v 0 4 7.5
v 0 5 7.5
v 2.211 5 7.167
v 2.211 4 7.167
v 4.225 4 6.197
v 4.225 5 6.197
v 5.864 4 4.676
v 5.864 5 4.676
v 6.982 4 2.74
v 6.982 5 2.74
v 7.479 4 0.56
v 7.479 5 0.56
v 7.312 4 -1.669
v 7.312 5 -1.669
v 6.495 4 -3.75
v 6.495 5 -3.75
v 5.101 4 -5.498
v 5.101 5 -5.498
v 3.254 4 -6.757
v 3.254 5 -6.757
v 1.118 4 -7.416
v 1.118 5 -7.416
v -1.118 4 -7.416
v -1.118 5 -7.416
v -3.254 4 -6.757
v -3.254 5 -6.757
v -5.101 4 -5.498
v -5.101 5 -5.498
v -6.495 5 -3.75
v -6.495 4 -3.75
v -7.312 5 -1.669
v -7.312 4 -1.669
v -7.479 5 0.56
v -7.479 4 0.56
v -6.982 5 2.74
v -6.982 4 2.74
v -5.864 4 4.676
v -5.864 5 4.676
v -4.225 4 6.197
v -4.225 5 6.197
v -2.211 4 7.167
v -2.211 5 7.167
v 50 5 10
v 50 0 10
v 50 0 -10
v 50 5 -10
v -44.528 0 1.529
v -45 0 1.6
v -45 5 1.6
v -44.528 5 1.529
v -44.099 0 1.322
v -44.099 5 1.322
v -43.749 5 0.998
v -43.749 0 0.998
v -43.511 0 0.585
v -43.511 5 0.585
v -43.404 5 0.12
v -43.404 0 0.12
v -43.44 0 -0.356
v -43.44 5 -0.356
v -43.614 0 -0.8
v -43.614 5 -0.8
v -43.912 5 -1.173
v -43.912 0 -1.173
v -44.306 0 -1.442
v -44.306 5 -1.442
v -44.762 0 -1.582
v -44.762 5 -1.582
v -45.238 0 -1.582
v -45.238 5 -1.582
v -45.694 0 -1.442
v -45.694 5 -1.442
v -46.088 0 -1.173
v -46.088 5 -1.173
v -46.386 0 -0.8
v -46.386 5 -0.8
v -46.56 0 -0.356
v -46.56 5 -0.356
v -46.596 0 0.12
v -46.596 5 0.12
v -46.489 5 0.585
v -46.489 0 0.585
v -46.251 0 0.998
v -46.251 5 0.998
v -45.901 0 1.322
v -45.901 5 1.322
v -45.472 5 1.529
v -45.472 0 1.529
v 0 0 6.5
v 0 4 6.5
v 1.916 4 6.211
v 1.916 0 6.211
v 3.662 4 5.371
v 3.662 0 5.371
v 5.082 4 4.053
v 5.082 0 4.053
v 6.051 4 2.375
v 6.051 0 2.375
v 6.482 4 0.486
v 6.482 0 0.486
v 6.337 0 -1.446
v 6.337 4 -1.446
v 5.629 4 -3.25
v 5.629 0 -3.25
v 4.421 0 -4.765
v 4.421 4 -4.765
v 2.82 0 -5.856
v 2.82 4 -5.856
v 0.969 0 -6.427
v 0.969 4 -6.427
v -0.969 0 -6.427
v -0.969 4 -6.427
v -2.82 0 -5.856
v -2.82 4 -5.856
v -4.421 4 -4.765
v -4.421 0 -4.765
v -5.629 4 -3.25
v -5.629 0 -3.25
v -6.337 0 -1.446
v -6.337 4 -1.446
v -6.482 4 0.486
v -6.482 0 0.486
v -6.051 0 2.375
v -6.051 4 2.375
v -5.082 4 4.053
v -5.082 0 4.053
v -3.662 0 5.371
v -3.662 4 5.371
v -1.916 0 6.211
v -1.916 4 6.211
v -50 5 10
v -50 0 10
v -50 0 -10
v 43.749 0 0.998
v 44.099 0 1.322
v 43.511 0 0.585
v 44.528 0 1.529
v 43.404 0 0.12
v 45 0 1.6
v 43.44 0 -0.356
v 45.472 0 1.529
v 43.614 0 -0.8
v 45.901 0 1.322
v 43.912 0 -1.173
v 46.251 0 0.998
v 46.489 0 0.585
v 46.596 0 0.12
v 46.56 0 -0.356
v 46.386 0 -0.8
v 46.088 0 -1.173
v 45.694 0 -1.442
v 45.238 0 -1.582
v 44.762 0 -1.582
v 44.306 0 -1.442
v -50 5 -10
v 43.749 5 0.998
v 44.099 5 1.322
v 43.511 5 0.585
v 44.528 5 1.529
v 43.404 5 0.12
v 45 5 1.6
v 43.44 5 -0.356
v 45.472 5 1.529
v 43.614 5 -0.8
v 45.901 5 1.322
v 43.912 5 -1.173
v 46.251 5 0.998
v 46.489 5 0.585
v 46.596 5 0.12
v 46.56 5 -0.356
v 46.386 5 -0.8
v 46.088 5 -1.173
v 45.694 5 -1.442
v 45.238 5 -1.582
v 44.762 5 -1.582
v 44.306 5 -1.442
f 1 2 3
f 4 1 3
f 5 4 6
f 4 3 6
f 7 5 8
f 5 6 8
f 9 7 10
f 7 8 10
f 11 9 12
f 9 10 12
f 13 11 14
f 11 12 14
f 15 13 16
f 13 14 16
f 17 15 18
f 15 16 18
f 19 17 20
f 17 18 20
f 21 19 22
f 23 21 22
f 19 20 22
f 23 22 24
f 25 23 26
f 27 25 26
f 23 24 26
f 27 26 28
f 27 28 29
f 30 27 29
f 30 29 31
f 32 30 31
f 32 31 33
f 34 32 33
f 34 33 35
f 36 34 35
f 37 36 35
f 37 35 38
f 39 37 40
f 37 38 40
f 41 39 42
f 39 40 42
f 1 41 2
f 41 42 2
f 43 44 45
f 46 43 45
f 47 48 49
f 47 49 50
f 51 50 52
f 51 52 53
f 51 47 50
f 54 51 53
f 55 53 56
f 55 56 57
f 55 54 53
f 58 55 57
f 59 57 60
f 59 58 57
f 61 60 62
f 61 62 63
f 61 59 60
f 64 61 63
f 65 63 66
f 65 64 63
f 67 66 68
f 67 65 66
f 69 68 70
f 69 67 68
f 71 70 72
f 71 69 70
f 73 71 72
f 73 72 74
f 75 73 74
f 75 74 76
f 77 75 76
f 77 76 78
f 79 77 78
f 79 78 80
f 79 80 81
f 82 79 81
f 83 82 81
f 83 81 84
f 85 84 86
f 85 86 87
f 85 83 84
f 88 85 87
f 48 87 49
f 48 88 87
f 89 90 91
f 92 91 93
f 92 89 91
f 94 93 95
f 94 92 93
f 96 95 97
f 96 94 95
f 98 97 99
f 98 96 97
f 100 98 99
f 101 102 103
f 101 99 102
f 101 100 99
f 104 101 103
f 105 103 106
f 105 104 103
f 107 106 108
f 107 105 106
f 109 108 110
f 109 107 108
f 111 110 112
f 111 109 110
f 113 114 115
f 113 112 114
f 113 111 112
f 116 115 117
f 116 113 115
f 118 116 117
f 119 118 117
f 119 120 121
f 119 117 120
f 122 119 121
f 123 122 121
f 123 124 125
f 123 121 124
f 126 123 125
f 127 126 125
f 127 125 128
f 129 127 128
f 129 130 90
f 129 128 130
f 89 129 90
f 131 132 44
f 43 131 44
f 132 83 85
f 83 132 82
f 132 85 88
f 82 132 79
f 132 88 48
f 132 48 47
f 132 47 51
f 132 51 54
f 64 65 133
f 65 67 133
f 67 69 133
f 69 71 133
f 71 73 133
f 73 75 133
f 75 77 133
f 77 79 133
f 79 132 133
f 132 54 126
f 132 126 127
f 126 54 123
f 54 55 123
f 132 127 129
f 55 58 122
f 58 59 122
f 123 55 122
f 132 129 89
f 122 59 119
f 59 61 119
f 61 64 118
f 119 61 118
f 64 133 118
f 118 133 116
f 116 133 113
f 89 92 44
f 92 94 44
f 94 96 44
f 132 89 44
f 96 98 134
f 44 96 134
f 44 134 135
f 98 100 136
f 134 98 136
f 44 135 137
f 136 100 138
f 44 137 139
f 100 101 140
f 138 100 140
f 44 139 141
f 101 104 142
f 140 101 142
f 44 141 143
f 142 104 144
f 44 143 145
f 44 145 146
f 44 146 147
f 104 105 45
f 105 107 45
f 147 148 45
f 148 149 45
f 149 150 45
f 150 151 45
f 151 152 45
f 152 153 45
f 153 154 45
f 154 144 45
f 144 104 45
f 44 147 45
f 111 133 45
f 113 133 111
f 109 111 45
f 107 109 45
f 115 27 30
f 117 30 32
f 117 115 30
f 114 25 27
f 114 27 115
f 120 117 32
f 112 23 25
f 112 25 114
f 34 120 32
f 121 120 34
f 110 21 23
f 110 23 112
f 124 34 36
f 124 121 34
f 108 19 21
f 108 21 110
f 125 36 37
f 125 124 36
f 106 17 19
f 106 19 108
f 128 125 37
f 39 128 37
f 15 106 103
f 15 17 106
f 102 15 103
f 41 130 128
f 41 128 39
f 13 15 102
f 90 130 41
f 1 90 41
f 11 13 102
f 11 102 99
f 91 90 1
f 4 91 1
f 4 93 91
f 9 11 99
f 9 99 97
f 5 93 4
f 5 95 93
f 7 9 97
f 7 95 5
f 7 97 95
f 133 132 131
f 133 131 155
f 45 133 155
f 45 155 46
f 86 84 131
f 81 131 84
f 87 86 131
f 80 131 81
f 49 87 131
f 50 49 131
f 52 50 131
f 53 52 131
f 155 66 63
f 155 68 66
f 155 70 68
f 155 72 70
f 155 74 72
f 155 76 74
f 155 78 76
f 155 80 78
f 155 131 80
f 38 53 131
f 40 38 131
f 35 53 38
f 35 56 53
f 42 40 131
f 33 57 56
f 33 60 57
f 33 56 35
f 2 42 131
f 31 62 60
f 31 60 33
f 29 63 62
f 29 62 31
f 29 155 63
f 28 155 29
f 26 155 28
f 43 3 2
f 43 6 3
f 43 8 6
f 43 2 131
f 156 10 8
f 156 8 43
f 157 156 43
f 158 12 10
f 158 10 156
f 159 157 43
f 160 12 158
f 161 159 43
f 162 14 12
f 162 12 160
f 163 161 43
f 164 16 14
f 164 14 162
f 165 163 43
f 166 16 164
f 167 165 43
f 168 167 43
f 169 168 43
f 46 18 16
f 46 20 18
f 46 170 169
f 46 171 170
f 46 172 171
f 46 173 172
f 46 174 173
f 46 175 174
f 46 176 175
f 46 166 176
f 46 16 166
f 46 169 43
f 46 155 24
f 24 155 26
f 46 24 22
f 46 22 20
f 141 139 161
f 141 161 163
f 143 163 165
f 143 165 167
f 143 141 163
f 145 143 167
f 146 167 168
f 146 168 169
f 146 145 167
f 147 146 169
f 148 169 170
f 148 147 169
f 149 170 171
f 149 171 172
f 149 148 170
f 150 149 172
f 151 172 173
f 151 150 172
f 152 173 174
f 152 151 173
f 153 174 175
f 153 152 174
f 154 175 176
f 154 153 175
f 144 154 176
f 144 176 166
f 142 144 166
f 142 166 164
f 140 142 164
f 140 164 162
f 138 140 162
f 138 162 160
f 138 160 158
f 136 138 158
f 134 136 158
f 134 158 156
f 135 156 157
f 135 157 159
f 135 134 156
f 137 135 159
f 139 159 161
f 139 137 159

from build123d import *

# Parameters (mm, degrees)
SKETCH_1_W          = 100
SKETCH_1_H          = 20
SKETCH_1_R          = 1.6
SKETCH_1_R_2        = 6.5
EXTRUDE_1_DEPTH     = 5
SKETCH_2_R          = 7.5
CUT_EXTRUDE_1_DEPTH = 1


with BuildPart() as part:
    # 草图1 → 凸台-拉伸1 (new body)
    with BuildSketch(Plane(origin=(0, 0, 0), x_dir=(1, 0, 0), z_dir=(0, 1, 0))):
        Rectangle(SKETCH_1_W, SKETCH_1_H)
        with Locations(Location((45, 0, 0), (0, 0, 270))):
            Circle(SKETCH_1_R, mode=Mode.SUBTRACT)
        with Locations(Location((-45, 0, 0), (0, 0, 270))):
            Circle(SKETCH_1_R, mode=Mode.SUBTRACT)
        with Locations(Location((0, 0, 0), (0, 0, 270))):
            Circle(SKETCH_1_R_2, mode=Mode.SUBTRACT)
    extrude(amount=EXTRUDE_1_DEPTH)

    # 草图2 → 切除-拉伸1 (cut)
    with BuildSketch(Plane(origin=(0, 5, 0), x_dir=(1, 0, 0), z_dir=(0, 1, 0))):
        with Locations(Location((0, 0, 0), (0, 0, 270))):
            Circle(SKETCH_2_R)
    extrude(amount=-CUT_EXTRUDE_1_DEPTH, mode=Mode.SUBTRACT)


solid = part.part
